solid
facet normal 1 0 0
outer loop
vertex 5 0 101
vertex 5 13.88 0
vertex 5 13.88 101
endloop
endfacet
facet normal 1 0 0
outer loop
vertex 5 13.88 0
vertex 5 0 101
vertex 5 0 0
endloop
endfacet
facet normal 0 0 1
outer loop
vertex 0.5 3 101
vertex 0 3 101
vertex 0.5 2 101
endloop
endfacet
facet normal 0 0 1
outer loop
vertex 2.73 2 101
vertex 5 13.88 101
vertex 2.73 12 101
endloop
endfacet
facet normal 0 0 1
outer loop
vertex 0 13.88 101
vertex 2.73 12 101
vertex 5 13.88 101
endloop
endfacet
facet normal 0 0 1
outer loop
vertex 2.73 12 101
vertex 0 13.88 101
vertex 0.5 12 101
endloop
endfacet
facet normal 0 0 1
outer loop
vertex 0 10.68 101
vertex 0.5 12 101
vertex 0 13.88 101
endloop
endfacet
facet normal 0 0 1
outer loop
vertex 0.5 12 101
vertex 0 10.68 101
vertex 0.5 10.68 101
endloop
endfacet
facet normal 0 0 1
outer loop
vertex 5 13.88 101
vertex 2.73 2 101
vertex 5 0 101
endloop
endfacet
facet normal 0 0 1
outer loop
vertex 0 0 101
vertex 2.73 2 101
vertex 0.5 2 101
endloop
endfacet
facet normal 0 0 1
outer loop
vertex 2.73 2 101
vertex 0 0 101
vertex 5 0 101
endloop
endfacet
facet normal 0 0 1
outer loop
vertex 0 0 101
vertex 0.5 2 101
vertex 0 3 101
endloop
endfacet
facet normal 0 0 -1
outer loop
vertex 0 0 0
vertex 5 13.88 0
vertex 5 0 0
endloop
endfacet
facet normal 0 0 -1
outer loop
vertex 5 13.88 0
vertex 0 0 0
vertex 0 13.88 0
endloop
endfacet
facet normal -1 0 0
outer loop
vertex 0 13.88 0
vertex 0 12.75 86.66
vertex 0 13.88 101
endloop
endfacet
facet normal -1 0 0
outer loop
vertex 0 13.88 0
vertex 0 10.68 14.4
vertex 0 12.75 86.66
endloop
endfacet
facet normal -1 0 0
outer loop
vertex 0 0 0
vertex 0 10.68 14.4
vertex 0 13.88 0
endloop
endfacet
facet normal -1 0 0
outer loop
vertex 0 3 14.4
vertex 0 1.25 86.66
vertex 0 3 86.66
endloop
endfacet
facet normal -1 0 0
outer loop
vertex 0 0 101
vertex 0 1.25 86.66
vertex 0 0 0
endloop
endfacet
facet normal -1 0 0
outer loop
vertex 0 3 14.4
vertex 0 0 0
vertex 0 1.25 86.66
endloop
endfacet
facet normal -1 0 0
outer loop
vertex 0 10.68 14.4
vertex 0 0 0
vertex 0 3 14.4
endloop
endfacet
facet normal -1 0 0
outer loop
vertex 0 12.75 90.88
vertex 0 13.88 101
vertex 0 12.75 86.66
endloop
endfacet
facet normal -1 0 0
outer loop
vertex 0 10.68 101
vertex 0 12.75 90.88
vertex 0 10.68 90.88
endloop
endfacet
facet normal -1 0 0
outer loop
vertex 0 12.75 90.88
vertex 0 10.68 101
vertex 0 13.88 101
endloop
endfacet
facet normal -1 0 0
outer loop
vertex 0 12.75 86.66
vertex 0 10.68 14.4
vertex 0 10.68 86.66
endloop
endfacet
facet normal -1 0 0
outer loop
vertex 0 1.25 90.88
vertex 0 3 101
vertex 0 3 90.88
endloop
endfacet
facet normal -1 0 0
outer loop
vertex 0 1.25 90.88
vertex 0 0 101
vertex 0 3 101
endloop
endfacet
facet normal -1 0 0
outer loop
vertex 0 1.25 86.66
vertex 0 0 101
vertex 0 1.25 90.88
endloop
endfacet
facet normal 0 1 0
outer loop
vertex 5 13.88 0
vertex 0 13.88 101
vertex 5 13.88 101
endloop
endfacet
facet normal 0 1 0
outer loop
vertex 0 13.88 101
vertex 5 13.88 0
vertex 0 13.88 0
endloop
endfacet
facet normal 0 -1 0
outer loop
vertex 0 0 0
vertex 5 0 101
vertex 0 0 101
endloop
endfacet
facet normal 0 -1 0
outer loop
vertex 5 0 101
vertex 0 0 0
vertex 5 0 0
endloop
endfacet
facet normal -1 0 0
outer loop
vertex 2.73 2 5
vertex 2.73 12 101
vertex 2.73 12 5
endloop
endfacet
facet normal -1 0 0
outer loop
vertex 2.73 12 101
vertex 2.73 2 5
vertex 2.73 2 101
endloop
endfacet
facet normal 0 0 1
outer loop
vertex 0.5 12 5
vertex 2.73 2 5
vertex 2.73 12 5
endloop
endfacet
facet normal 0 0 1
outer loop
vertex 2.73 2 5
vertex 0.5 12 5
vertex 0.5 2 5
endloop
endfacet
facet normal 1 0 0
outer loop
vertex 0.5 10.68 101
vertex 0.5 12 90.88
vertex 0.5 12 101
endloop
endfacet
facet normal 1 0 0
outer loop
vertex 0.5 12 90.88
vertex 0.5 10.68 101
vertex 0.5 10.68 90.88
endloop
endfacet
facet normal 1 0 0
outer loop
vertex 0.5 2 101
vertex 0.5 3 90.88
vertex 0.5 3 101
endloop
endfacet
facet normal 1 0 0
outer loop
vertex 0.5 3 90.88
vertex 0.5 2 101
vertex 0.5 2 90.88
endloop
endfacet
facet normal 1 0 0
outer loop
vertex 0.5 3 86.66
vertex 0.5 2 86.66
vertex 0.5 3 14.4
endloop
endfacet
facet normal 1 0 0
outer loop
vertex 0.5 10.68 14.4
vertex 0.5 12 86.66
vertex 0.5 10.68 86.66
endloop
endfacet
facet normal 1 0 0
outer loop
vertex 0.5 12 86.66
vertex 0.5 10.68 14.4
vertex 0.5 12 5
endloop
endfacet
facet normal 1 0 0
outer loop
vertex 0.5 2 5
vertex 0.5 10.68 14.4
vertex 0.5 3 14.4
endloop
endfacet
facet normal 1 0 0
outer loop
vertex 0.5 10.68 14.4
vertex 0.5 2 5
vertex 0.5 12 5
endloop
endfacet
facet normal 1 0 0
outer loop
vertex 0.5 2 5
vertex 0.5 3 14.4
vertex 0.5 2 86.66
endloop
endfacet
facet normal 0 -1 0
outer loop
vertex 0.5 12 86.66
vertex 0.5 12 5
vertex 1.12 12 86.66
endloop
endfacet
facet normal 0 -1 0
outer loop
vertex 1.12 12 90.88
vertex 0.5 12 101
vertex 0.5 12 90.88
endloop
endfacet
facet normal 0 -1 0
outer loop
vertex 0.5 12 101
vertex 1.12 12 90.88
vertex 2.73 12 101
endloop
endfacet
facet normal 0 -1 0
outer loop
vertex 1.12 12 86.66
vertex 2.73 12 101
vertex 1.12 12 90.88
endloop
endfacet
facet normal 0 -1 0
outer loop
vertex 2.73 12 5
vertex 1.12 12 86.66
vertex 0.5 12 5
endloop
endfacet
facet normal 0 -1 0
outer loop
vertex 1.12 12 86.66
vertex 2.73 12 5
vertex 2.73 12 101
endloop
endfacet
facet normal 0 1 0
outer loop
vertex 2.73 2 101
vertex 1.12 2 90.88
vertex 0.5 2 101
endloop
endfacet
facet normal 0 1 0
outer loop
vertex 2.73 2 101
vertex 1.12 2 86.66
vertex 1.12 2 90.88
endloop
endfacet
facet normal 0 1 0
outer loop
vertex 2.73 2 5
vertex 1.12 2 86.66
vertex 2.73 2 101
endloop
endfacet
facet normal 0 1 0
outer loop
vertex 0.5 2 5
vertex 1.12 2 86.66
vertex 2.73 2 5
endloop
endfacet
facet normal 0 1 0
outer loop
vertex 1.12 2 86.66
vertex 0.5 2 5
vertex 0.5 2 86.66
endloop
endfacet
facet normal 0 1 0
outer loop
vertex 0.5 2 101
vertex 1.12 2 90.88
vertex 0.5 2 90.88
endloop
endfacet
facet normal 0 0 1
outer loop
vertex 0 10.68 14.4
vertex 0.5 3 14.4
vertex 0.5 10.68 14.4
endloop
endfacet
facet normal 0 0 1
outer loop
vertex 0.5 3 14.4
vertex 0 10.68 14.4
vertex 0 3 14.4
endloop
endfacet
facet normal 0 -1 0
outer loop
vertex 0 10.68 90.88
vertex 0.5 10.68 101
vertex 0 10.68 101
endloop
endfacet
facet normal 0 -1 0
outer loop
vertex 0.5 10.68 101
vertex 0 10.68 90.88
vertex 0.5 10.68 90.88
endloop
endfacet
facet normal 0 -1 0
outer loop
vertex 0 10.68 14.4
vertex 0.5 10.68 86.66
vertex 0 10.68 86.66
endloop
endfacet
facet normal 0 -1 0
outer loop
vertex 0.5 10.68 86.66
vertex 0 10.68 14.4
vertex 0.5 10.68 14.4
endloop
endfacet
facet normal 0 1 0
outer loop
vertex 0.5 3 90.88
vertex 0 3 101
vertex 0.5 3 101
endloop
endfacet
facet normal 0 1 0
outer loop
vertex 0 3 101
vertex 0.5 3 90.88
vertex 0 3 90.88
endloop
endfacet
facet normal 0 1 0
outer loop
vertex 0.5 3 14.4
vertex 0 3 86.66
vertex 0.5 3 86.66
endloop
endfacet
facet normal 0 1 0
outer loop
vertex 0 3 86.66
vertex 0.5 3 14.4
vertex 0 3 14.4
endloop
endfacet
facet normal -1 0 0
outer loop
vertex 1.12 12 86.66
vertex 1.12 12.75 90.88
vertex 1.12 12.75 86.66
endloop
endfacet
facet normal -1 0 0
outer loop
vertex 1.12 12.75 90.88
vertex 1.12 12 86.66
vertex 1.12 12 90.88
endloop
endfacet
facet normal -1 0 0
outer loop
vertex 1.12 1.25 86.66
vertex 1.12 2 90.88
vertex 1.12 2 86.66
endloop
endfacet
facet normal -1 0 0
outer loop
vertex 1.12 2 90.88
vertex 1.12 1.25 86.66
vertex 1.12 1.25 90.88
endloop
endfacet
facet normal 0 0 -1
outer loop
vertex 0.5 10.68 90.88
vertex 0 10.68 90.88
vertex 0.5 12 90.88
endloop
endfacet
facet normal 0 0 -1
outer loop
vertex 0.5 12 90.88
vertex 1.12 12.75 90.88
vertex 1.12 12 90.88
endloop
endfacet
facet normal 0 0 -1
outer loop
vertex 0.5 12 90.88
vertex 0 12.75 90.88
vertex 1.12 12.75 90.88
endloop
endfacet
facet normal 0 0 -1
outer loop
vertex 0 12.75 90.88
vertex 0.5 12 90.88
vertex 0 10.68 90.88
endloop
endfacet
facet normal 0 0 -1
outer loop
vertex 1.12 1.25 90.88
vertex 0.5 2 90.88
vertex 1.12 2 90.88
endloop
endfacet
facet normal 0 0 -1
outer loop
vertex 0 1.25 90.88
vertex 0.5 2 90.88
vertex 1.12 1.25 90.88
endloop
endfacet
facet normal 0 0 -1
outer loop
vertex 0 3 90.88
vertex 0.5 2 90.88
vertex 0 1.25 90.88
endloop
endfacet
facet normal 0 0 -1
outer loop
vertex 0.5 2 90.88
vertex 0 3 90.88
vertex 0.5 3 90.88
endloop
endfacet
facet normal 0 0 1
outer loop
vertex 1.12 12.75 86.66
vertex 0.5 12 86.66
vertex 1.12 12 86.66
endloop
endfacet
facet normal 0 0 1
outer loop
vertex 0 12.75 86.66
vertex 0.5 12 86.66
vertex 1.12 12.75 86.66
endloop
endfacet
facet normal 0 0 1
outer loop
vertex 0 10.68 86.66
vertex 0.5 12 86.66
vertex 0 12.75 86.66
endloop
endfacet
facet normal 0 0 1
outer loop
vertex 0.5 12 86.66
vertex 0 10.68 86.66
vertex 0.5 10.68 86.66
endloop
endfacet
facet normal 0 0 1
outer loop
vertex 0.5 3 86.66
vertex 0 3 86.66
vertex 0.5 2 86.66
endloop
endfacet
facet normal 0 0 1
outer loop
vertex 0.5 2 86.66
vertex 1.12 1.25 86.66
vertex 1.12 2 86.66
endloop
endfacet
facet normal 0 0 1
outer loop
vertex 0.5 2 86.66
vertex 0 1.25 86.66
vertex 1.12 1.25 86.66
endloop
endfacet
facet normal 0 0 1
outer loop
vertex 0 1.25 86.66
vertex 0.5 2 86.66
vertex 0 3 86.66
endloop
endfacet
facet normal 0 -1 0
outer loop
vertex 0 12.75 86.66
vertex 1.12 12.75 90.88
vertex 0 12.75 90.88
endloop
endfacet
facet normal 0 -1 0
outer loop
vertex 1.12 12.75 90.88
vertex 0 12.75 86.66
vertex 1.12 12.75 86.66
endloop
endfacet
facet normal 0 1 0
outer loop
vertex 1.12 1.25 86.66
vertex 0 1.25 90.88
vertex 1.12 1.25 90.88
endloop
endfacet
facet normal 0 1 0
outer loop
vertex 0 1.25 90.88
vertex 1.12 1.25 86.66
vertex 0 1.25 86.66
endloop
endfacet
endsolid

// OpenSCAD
difference() {
    
    cube([5,13.88,101]);

    translate([0.5,2,5])cube([2.23,10,96]);
    translate([-2,3,14.4])cube([4,7.68,96]);
    translate([0,1.25,86.66])cube([1.12,11.5,4.22]);

}

//Designed by Cyberandrew03, https://www.thingiverse.com/Cyberandrew03/about
